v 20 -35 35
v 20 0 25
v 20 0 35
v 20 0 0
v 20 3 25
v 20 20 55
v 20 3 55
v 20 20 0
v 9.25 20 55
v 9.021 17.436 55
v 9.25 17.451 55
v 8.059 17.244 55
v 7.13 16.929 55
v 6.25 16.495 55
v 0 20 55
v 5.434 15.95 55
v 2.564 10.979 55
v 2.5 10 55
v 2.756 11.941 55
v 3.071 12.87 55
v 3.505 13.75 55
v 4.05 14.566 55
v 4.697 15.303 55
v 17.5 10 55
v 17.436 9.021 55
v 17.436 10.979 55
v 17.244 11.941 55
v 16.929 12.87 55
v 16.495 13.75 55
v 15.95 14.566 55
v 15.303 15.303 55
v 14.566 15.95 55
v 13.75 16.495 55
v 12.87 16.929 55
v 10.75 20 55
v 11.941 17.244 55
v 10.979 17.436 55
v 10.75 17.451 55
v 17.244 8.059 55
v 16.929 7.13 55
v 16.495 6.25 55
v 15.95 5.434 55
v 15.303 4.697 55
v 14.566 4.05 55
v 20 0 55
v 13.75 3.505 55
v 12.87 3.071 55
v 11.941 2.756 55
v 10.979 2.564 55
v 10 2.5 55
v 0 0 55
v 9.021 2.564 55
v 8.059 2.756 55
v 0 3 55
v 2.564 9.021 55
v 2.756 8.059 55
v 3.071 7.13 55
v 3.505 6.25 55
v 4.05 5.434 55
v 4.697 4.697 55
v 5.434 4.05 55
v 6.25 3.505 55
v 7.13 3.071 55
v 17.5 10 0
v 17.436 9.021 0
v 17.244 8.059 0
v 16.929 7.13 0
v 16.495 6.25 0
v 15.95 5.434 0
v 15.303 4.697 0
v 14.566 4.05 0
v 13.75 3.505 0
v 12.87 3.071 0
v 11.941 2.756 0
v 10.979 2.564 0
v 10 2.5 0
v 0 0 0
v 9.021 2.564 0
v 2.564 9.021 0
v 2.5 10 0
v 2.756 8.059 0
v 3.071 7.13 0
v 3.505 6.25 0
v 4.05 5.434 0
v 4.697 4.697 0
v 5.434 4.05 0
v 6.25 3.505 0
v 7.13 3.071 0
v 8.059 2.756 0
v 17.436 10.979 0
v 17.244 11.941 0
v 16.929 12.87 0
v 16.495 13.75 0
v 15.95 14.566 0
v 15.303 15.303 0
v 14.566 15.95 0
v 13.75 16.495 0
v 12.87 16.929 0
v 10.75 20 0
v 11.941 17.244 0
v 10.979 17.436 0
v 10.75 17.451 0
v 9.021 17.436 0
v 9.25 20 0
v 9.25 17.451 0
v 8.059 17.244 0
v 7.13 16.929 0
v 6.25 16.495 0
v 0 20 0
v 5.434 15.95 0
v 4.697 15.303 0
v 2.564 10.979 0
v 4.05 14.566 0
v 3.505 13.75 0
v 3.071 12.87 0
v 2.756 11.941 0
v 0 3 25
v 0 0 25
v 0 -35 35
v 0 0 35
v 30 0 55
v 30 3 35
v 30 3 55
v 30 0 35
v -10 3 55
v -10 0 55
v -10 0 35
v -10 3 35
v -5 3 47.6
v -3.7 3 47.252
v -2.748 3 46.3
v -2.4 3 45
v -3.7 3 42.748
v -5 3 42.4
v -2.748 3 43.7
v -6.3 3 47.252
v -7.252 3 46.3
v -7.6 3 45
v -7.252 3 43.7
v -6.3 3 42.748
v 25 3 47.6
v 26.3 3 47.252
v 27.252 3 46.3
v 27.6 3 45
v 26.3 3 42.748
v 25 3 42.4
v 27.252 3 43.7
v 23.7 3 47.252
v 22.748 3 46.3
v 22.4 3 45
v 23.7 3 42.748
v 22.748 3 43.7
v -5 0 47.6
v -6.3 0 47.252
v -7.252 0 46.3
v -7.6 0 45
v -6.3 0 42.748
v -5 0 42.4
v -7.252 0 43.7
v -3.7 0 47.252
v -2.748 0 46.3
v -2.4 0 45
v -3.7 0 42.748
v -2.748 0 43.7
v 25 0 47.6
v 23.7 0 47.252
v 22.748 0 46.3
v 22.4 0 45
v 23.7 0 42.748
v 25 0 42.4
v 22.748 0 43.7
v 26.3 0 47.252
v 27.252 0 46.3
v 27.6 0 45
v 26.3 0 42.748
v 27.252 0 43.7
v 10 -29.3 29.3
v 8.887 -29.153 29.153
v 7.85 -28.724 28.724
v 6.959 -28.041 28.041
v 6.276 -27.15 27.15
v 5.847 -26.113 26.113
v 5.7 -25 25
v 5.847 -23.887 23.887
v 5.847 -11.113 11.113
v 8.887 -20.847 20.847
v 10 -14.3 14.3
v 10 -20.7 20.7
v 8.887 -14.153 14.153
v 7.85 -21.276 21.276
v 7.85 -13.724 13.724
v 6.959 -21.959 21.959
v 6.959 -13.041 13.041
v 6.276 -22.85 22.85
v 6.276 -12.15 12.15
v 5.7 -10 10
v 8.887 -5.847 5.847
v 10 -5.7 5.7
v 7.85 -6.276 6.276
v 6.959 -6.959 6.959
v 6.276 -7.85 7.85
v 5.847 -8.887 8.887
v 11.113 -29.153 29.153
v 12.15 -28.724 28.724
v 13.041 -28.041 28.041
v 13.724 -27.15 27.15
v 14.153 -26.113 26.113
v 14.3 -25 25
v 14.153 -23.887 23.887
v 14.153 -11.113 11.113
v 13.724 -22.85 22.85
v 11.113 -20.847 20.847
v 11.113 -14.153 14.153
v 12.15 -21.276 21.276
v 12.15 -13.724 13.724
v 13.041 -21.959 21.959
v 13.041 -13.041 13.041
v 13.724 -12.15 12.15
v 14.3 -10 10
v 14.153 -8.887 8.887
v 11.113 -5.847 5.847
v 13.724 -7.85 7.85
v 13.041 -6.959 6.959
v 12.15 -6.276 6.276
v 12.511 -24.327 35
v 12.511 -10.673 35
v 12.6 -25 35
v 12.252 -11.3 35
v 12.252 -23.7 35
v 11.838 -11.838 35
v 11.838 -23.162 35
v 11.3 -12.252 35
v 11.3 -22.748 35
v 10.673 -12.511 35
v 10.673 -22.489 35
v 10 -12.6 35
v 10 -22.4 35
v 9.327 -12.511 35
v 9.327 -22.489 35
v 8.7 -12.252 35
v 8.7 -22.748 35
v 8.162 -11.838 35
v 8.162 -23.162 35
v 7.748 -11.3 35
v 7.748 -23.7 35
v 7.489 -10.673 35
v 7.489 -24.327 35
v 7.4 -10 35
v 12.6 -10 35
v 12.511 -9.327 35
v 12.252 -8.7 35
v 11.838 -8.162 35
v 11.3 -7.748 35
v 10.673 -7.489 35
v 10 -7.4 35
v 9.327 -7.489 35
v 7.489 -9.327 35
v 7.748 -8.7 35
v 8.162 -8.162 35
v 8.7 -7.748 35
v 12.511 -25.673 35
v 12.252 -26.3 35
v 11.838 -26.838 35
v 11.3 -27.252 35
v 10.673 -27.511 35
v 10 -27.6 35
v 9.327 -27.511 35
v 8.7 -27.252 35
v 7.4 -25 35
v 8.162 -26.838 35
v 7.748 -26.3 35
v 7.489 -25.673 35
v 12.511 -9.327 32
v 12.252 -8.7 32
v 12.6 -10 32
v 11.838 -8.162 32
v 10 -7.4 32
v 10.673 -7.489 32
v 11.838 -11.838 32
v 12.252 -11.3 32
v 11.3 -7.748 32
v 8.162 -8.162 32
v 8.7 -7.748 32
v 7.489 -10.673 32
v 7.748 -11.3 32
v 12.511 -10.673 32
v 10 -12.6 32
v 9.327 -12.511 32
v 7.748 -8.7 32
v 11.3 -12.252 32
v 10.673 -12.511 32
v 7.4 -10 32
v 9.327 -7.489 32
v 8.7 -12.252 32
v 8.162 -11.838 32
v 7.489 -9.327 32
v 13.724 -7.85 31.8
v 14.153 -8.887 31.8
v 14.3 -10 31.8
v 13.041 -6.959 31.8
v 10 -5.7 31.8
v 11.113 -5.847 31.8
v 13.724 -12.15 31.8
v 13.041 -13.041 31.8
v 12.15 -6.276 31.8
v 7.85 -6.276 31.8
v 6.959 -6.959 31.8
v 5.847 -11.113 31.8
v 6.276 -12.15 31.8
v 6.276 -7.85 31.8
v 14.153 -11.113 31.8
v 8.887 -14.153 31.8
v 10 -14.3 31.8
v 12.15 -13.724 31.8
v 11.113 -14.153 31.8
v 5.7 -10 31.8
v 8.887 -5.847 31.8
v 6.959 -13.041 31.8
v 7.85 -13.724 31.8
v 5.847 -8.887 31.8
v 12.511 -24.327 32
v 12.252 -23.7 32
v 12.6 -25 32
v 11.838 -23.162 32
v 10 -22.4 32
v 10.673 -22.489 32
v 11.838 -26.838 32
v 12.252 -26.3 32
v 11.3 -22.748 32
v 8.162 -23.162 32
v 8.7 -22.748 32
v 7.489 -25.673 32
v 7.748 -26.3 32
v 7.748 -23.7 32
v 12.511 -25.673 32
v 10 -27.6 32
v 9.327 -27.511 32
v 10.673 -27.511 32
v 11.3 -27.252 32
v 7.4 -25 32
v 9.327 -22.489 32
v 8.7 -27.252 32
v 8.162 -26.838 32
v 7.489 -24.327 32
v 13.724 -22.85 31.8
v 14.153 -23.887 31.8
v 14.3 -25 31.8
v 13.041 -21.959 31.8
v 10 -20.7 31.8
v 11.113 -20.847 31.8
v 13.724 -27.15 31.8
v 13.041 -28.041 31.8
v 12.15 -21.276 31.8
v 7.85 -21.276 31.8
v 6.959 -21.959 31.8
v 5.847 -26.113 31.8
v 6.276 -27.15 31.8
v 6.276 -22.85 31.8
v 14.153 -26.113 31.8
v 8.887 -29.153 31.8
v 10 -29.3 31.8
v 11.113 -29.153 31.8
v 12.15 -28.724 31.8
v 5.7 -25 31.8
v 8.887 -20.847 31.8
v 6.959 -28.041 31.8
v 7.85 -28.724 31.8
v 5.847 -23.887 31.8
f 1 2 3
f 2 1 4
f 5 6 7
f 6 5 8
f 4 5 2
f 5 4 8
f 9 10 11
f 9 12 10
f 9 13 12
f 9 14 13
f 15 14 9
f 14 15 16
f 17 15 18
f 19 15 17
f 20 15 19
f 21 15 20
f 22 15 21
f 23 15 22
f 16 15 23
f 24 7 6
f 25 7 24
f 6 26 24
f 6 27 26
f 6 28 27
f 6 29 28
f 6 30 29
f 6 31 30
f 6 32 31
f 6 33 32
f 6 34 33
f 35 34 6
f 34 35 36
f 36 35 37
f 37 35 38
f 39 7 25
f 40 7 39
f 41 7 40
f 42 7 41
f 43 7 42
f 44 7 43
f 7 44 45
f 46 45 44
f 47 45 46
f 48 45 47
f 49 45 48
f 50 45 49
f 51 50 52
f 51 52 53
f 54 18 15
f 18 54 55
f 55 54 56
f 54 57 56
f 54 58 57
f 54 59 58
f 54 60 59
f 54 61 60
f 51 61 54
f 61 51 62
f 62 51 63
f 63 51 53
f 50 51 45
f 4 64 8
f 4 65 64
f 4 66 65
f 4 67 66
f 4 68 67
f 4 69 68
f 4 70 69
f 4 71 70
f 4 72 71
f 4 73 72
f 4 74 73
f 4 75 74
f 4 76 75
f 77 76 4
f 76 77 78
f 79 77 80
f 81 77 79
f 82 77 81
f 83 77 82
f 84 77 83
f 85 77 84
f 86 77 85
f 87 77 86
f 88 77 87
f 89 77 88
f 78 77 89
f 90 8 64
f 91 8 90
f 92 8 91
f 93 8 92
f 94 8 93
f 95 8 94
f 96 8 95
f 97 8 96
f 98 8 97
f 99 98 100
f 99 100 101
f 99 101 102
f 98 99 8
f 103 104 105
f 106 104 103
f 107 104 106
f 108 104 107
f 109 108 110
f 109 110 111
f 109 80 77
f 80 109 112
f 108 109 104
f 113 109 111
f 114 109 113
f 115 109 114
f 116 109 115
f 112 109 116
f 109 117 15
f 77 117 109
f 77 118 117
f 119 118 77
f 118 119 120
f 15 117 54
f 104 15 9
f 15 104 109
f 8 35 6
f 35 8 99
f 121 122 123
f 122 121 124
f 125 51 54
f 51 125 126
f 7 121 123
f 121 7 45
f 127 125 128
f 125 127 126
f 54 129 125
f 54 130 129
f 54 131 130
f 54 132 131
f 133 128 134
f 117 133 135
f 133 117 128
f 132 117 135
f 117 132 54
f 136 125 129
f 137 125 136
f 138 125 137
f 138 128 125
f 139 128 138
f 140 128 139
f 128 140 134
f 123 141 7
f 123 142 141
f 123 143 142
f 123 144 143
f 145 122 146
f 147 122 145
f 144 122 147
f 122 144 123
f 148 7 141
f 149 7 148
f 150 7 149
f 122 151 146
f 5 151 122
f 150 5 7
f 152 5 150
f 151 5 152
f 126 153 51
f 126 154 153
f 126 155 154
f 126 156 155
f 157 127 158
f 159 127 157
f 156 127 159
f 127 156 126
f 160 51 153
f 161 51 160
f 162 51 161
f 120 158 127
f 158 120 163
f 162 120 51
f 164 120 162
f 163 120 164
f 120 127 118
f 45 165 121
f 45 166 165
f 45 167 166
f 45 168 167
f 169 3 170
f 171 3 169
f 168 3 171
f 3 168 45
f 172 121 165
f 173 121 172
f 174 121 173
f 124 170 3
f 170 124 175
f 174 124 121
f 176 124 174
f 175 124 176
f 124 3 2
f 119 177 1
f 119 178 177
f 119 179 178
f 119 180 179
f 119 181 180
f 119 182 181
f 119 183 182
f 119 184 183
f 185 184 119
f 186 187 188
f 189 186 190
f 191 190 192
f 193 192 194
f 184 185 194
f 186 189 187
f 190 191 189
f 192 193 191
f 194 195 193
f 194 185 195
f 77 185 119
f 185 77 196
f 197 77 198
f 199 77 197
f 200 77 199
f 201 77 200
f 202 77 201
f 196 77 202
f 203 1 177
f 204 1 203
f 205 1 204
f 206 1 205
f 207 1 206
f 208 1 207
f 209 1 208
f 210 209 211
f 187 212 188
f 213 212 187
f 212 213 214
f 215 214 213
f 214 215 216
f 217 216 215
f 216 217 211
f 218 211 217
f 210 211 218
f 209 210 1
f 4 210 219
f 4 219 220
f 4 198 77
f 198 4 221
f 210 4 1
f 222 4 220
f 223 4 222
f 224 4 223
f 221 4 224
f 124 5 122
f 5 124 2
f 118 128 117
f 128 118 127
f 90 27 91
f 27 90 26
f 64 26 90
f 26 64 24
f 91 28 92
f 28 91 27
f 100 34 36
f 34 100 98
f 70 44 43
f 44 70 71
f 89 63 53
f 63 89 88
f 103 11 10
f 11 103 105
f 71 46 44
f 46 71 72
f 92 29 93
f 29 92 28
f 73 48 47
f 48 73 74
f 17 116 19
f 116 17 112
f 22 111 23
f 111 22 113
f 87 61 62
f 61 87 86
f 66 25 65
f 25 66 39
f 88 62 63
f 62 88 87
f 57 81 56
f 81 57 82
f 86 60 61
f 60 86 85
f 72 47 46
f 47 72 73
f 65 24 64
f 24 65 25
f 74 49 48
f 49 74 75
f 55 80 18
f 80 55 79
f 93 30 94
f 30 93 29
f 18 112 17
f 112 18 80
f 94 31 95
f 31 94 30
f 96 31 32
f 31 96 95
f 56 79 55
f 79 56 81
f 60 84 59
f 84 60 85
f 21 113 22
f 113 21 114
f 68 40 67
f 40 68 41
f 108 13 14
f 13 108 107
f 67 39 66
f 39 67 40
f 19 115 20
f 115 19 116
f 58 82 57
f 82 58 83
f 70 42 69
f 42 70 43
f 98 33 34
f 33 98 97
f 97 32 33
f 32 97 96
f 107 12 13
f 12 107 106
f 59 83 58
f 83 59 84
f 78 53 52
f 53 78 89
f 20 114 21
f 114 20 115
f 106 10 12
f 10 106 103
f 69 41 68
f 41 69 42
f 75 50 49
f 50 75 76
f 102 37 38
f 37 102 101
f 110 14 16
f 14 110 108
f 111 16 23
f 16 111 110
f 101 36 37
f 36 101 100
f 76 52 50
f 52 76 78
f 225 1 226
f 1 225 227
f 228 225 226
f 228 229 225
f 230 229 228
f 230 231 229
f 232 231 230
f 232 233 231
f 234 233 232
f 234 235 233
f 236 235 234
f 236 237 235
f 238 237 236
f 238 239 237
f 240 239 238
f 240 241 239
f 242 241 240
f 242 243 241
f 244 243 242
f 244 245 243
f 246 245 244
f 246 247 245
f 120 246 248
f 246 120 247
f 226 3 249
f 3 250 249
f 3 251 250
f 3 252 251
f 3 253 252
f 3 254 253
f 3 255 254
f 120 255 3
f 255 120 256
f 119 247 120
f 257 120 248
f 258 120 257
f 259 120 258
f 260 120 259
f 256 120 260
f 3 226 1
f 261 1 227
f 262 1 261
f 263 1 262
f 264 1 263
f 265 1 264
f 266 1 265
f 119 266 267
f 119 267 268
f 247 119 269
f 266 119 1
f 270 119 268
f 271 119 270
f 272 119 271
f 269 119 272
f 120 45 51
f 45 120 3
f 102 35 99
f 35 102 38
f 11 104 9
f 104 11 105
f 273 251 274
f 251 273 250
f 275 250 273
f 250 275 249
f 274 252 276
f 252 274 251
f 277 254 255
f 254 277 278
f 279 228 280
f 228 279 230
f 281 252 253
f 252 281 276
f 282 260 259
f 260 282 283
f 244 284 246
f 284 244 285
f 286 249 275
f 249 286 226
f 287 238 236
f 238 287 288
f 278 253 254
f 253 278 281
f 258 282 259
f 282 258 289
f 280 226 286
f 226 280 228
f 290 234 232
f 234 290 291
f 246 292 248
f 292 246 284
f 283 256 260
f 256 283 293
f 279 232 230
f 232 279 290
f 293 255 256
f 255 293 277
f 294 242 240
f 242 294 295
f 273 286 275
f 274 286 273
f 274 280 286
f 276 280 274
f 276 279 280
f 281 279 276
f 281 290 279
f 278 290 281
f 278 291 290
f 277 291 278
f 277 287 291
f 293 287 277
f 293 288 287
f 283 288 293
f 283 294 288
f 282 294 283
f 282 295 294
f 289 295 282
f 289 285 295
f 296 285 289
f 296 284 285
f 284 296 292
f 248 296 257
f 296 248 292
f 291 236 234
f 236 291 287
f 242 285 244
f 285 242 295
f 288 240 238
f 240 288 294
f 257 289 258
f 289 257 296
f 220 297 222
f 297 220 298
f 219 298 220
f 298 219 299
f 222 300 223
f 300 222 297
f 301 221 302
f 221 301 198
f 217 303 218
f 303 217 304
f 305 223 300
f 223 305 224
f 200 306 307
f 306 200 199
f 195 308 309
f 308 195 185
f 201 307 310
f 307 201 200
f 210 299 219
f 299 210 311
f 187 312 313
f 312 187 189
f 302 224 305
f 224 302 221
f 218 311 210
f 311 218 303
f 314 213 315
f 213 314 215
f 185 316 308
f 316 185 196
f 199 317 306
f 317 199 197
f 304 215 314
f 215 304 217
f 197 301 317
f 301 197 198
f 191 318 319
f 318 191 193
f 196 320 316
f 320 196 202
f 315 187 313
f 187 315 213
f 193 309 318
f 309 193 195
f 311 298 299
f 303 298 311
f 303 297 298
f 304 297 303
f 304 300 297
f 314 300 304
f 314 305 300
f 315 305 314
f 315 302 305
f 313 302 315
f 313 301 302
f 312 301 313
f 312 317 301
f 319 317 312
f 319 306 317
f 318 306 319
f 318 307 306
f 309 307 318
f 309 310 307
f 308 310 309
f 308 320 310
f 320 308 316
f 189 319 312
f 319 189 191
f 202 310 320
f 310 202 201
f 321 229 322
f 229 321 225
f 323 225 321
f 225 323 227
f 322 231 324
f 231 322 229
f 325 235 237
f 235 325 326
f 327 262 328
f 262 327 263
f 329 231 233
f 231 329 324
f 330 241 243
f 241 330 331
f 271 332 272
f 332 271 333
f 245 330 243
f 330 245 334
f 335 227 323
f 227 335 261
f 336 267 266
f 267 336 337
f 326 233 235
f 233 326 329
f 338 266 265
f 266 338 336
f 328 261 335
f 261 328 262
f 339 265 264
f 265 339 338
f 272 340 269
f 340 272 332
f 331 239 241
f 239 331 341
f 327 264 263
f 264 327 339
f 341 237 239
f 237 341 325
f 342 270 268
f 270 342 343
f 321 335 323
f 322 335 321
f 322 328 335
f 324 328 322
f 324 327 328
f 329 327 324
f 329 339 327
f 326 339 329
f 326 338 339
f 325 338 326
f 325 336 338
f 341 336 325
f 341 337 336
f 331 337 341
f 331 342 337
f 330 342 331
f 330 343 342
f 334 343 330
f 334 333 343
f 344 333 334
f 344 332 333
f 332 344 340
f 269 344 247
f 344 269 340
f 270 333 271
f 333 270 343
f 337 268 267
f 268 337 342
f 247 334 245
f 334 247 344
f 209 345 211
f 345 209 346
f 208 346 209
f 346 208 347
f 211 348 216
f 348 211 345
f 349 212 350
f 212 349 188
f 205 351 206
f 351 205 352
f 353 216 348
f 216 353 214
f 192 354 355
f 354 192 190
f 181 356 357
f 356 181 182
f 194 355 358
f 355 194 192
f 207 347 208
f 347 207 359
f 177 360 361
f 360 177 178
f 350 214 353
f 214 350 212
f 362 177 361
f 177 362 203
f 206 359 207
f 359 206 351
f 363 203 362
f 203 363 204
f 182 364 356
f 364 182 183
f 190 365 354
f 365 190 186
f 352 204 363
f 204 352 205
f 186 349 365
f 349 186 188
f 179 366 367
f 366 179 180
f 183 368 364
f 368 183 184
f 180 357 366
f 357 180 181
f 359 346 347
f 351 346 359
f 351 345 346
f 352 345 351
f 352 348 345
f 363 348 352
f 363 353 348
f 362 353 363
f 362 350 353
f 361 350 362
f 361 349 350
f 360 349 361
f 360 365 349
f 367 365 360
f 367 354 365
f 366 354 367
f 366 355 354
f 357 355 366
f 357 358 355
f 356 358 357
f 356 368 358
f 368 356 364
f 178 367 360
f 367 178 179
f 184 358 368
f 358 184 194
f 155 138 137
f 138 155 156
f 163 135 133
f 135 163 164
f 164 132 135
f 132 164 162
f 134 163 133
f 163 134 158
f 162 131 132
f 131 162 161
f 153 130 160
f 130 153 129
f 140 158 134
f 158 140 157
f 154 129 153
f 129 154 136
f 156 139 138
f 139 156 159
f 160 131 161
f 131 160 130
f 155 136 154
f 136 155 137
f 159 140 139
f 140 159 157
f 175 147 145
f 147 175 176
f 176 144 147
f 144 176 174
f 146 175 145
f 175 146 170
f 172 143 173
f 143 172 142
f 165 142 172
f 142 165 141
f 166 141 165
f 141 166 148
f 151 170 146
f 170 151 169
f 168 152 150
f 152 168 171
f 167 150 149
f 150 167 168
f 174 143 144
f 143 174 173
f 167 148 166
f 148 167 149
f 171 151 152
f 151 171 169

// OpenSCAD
difference()
{
    union()
    {
        cube([20,20,55]);
        
        translate([-10,0,35])
            cube([40,3,20]);
        
        rotate([45,0,0])
            cube([20,50,50]);
        
        translate([-10,0,35])
            rotate([0,45,0])
                cube([40/sqrt(2),3,40/sqrt(2)]);
    }
    union()
    {
        translate([10,10,0])
            cylinder(d=15,h=55,$fn=48);
        
        translate([0,-50,35])
            cube([20,50,40]);
        translate([0,0,55])
            cube([20,20,20]);
        translate([0,20,0])
            cube([20,20,55]);
        
        translate([10-1.5/2,10,0])
            cube([1.5,20,55]);
        
        
        translate([10,-10,35-3])
            cylinder(d=5.2,h=3,$fn=24);
        translate([10,-10,0])
            cylinder(d=8.6,h=31.8,$fn=24);
        
        translate([10,-25,35-3])
            cylinder(d=5.2,h=3,$fn=24);
        translate([10,-25,0])
            cylinder(d=8.6,h=31.8,$fn=24);
            
        translate([-5,0,45])
            rotate([270,0,0])
                cylinder(d=5.2,h=4,$fn=12);
        translate([25,0,45])
            rotate([270,0,0])
                cylinder(d=5.2,h=4,$fn=12);
        
    }
}
